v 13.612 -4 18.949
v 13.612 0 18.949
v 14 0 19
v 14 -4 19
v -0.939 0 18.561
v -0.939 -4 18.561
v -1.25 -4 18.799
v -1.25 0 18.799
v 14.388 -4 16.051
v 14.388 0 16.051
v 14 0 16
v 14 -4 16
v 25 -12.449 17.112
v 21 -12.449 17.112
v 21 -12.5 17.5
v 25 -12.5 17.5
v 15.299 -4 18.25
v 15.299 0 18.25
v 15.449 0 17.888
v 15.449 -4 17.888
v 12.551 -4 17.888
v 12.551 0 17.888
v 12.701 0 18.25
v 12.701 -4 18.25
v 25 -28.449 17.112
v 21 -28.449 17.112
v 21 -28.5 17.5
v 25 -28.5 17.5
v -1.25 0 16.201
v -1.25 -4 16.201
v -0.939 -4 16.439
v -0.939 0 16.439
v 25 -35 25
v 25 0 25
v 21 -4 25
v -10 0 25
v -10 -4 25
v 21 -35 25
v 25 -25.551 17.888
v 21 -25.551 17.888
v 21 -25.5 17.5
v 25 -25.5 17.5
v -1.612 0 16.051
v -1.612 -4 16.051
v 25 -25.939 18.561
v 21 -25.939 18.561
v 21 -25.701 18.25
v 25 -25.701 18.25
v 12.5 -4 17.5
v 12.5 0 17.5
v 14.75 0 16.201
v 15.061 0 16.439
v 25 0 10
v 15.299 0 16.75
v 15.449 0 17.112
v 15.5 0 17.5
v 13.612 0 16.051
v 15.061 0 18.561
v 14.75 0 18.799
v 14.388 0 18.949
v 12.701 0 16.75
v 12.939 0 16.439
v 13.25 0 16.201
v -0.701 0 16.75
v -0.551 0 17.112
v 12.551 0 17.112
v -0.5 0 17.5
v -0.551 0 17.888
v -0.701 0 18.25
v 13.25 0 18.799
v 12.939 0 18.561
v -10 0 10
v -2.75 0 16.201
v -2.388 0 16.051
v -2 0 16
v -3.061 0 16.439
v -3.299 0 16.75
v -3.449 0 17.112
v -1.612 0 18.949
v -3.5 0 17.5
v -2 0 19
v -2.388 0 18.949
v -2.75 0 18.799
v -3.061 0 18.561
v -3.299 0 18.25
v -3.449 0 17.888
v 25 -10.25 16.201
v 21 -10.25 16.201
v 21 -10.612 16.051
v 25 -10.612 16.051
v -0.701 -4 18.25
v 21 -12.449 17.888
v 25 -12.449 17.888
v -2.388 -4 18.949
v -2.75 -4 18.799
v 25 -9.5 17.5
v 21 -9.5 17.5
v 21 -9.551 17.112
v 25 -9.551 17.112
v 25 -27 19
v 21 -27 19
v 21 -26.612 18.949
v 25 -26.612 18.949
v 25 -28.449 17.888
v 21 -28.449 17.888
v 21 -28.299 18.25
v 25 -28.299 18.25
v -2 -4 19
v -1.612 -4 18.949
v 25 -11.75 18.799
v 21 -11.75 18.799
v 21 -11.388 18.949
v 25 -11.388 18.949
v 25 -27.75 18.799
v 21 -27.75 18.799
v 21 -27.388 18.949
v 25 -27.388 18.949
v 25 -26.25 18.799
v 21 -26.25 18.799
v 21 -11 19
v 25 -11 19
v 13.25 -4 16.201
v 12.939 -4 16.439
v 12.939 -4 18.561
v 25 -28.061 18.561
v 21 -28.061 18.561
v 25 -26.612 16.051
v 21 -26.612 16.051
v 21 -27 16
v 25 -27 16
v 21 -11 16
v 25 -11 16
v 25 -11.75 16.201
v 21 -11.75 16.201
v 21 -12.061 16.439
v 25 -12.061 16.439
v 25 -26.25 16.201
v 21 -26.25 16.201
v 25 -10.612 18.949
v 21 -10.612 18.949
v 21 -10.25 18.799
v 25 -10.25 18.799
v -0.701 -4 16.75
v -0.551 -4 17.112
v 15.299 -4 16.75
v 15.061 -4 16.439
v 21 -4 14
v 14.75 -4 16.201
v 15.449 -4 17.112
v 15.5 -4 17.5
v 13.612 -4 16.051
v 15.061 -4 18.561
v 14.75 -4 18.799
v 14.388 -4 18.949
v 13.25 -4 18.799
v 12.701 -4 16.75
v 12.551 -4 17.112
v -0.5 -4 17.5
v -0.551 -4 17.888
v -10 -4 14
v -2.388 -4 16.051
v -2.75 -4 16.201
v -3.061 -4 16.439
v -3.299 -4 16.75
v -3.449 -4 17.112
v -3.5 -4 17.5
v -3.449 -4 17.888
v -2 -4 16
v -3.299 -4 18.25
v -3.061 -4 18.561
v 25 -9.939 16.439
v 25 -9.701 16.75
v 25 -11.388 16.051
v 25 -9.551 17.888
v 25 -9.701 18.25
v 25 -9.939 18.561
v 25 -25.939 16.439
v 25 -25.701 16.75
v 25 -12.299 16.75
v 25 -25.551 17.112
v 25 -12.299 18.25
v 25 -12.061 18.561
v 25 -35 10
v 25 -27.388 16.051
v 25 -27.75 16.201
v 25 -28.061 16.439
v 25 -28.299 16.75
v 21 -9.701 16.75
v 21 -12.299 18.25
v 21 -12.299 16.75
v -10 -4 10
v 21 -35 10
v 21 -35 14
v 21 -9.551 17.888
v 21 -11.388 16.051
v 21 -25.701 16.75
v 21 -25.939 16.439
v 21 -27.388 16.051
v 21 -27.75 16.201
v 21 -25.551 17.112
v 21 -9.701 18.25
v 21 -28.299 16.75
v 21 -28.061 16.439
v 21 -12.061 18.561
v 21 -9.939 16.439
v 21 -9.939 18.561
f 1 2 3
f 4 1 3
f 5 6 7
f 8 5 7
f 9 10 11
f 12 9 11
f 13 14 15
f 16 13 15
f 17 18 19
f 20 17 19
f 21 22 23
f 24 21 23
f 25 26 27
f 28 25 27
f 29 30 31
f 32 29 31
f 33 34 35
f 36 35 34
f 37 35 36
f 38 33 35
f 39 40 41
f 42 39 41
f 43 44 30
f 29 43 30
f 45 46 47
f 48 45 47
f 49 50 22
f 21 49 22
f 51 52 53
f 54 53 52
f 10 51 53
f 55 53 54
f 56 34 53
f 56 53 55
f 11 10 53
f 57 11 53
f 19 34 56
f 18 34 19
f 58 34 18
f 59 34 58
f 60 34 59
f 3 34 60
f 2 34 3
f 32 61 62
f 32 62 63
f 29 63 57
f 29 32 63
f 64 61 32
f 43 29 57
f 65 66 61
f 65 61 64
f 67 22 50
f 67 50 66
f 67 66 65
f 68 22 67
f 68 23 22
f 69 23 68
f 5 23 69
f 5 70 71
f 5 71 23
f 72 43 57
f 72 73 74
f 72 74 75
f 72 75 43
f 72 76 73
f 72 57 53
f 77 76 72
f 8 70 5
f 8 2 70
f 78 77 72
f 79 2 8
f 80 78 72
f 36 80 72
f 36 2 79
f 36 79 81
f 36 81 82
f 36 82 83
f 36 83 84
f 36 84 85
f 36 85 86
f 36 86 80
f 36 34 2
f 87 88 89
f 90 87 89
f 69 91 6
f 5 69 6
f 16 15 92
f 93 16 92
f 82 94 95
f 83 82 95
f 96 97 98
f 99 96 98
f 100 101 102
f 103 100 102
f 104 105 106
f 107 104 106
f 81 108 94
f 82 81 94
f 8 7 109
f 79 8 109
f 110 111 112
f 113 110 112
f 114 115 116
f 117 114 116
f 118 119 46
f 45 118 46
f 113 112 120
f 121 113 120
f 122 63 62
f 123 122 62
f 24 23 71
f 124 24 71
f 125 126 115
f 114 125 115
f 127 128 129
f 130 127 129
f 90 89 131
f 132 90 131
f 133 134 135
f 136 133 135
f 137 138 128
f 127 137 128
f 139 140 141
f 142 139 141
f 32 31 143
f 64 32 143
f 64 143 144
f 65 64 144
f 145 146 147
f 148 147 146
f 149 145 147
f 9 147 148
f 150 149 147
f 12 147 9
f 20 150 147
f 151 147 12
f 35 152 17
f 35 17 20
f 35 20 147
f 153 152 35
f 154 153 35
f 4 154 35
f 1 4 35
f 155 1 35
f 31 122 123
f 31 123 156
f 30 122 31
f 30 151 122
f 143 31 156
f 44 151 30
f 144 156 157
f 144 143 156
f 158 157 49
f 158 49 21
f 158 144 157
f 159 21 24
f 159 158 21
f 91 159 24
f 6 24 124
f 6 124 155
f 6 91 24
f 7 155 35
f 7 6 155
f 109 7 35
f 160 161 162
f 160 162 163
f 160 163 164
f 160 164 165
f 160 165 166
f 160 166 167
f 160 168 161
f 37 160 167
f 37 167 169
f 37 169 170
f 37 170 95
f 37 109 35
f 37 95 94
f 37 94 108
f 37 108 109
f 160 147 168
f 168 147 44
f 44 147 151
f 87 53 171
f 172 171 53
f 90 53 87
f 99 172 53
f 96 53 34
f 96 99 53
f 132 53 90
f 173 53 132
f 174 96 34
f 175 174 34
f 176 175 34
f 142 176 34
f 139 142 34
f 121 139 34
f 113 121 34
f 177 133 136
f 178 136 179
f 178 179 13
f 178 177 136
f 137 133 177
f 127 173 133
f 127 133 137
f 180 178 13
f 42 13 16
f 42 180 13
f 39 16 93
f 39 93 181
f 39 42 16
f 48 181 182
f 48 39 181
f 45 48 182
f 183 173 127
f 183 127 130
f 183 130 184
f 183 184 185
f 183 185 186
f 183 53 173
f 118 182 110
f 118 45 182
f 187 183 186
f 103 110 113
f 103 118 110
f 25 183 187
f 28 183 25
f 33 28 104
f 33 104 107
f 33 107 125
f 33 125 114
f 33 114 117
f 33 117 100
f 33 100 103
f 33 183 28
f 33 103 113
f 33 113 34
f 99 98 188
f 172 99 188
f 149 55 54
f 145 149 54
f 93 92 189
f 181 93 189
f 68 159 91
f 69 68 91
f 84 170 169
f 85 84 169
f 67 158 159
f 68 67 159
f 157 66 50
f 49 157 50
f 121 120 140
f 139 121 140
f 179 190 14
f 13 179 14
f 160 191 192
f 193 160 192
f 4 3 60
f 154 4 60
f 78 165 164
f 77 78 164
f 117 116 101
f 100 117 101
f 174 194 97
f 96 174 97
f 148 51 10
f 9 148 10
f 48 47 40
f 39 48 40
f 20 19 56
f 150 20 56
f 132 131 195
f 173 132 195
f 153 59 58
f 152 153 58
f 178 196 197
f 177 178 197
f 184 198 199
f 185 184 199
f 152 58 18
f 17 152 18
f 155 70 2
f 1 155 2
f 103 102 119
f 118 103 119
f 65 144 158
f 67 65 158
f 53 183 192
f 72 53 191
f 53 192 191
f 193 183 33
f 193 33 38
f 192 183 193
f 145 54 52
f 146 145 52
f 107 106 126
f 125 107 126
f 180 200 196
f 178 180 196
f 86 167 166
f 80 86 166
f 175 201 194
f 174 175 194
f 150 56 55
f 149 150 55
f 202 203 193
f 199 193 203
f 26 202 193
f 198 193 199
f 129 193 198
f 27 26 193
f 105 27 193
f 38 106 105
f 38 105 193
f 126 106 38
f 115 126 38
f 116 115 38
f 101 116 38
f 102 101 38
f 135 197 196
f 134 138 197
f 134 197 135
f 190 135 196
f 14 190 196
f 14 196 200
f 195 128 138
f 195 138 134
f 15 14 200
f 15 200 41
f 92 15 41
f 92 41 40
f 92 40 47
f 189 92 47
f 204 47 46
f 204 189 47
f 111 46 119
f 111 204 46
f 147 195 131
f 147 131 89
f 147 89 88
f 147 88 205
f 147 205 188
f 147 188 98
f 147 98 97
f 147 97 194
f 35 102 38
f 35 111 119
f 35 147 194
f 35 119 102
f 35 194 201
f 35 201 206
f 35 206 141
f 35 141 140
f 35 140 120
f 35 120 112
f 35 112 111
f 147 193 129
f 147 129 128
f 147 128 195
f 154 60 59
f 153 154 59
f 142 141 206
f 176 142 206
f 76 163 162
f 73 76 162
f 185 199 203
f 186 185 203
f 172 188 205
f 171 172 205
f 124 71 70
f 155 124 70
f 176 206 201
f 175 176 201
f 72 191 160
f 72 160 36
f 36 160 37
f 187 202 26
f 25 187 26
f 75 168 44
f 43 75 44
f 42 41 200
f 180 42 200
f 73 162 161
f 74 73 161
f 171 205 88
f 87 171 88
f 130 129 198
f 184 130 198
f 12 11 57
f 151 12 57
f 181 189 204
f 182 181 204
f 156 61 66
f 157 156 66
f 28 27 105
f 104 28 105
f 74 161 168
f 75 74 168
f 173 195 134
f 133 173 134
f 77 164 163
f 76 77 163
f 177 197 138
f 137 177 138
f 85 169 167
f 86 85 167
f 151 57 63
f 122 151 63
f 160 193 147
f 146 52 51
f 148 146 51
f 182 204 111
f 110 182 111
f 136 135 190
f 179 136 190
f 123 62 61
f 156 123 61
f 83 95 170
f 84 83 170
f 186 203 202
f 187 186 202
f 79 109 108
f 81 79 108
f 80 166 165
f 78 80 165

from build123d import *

# Parameters (mm, degrees)
SKETCH1_W           = 35
SKETCH1_H           = 31
BOSS_EXTRUDE1_DEPTH = 15
CUT_EXTRUDE1_DEPTH  = 4
SKETCH3_W           = 35
SKETCH3_H           = 15
BOSS_EXTRUDE2_DEPTH = 4
SKETCH4_W           = 11
SKETCH4_H           = 31
CUT_EXTRUDE2_DEPTH  = 31
CUT_EXTRUDE3_DEPTH  = 48.021271782
CUT_EXTRUDE4_DEPTH  = 54.018864567
CUT_EXTRUDE5_DEPTH  = 54.018864567
CUT_EXTRUDE6_DEPTH  = 50.749371855


with BuildPart() as part:
    # Sketch1 → Boss-Extrude1 (new body)
    with BuildSketch(Plane(origin=(0, 0, 10), x_dir=(-1, 0, 0), z_dir=(0, 0, -1))):
        with Locations((-7.5, -19.5)):
            Rectangle(SKETCH1_W, SKETCH1_H)
    extrude(amount=-BOSS_EXTRUDE1_DEPTH)

    # Sketch2 → Cut-Extrude1 (cut)
    with BuildSketch(Plane(origin=(0, 0, 10), x_dir=(-1, 0, 0), z_dir=(0, 0, -1))):
        Polygon((10, -4), (-21, -35), (10, -35), align=None)
    extrude(amount=-CUT_EXTRUDE1_DEPTH, mode=Mode.SUBTRACT)

    # Sketch3 → Boss-Extrude2 (add)
    with BuildSketch(Plane(origin=(0, -4, 0), x_dir=(-1, 0, 0), z_dir=(0, 1, 0))):
        with Locations((-7.5, 17.5)):
            Rectangle(SKETCH3_W, SKETCH3_H)
    extrude(amount=BOSS_EXTRUDE2_DEPTH)

    # Sketch4 → Cut-Extrude2 (cut)
    with BuildSketch(Plane.ZY.offset(10)):
        with Locations((19.5, -19.5)):
            Rectangle(SKETCH4_W, SKETCH4_H)
    extrude(amount=-CUT_EXTRUDE2_DEPTH, mode=Mode.SUBTRACT)

    # Sketch5 → Cut-Extrude3 (cut, through all)
    with BuildSketch(Plane.XZ.offset(4)):
        Polygon((-2.75, 16.20096), (-2.388229, 16.05111), (-2, 16), (-1.611771, 16.05111), (-1.25, 16.20096), (-0.9393398, 16.43934), (-0.7009619, 16.75), (-0.5511113, 17.11177), (-0.5, 17.5), (-0.5511113, 17.88823), (-0.7009619, 18.25), (-0.9393398, 18.56066), (-1.25, 18.79904), (-1.611771, 18.94889), (-2, 19), (-2.388229, 18.94889), (-2.75, 18.79904), (-3.06066, 18.56066), (-3.299038, 18.25), (-3.448889, 17.88823), (-3.5, 17.5), (-3.448889, 17.11177), (-3.299038, 16.75), (-3.06066, 16.43934), align=None)
    extrude(amount=-CUT_EXTRUDE3_DEPTH, mode=Mode.SUBTRACT)

    # Sketch6 → Cut-Extrude4 (cut, through all)
    with BuildSketch(Plane.ZY.offset(-21)):
        Polygon((17.11177, -28.44889), (17.5, -28.5), (17.88823, -28.44889), (18.25, -28.29904), (18.56066, -28.06066), (18.79904, -27.75), (18.94889, -27.38823), (19, -27), (18.94889, -26.61177), (18.79904, -26.25), (18.56066, -25.93934), (18.25, -25.70096), (17.88823, -25.55111), (17.5, -25.5), (17.11177, -25.55111), (16.75, -25.70096), (16.43934, -25.93934), (16.20096, -26.25), (16.05111, -26.61177), (16, -27), (16.05111, -27.38823), (16.20096, -27.75), (16.43934, -28.06066), (16.75, -28.29904), align=None)
    extrude(amount=-CUT_EXTRUDE4_DEPTH, mode=Mode.SUBTRACT)

    # Sketch7 → Cut-Extrude5 (cut, through all)
    with BuildSketch(Plane.ZY.offset(-21)):
        Polygon((16.20096, -11.75), (16.43934, -12.06066), (16.75, -12.29904), (17.11177, -12.44889), (17.5, -12.5), (17.88823, -12.44889), (18.25, -12.29904), (18.56066, -12.06066), (18.79904, -11.75), (18.94889, -11.38823), (19, -11), (18.94889, -10.61177), (18.79904, -10.25), (18.56066, -9.93934), (18.25, -9.700962), (17.88823, -9.551111), (17.5, -9.5), (17.11177, -9.551111), (16.75, -9.700962), (16.43934, -9.93934), (16.20096, -10.25), (16.05111, -10.61177), (16, -11), (16.05111, -11.38823), align=None)
    extrude(amount=-CUT_EXTRUDE5_DEPTH, mode=Mode.SUBTRACT)

    # Sketch8 → Cut-Extrude6 (cut, through all)
    with BuildSketch(Plane(origin=(0, 0, 0), x_dir=(-1, 0, 0), z_dir=(0, 1, 0))):
        Polygon((-12.70096, 16.75), (-12.55111, 17.11177), (-12.5, 17.5), (-12.55111, 17.88823), (-12.70096, 18.25), (-12.93934, 18.56066), (-13.25, 18.79904), (-13.61177, 18.94889), (-14, 19), (-14.38823, 18.94889), (-14.75, 18.79904), (-15.06066, 18.56066), (-15.29904, 18.25), (-15.44889, 17.88823), (-15.5, 17.5), (-15.44889, 17.11177), (-15.29904, 16.75), (-15.06066, 16.43934), (-14.75, 16.20096), (-14.38823, 16.05111), (-14, 16), (-13.61177, 16.05111), (-13.25, 16.20096), (-12.93934, 16.43934), align=None)
    extrude(amount=-CUT_EXTRUDE6_DEPTH, mode=Mode.SUBTRACT)


solid = part.part
